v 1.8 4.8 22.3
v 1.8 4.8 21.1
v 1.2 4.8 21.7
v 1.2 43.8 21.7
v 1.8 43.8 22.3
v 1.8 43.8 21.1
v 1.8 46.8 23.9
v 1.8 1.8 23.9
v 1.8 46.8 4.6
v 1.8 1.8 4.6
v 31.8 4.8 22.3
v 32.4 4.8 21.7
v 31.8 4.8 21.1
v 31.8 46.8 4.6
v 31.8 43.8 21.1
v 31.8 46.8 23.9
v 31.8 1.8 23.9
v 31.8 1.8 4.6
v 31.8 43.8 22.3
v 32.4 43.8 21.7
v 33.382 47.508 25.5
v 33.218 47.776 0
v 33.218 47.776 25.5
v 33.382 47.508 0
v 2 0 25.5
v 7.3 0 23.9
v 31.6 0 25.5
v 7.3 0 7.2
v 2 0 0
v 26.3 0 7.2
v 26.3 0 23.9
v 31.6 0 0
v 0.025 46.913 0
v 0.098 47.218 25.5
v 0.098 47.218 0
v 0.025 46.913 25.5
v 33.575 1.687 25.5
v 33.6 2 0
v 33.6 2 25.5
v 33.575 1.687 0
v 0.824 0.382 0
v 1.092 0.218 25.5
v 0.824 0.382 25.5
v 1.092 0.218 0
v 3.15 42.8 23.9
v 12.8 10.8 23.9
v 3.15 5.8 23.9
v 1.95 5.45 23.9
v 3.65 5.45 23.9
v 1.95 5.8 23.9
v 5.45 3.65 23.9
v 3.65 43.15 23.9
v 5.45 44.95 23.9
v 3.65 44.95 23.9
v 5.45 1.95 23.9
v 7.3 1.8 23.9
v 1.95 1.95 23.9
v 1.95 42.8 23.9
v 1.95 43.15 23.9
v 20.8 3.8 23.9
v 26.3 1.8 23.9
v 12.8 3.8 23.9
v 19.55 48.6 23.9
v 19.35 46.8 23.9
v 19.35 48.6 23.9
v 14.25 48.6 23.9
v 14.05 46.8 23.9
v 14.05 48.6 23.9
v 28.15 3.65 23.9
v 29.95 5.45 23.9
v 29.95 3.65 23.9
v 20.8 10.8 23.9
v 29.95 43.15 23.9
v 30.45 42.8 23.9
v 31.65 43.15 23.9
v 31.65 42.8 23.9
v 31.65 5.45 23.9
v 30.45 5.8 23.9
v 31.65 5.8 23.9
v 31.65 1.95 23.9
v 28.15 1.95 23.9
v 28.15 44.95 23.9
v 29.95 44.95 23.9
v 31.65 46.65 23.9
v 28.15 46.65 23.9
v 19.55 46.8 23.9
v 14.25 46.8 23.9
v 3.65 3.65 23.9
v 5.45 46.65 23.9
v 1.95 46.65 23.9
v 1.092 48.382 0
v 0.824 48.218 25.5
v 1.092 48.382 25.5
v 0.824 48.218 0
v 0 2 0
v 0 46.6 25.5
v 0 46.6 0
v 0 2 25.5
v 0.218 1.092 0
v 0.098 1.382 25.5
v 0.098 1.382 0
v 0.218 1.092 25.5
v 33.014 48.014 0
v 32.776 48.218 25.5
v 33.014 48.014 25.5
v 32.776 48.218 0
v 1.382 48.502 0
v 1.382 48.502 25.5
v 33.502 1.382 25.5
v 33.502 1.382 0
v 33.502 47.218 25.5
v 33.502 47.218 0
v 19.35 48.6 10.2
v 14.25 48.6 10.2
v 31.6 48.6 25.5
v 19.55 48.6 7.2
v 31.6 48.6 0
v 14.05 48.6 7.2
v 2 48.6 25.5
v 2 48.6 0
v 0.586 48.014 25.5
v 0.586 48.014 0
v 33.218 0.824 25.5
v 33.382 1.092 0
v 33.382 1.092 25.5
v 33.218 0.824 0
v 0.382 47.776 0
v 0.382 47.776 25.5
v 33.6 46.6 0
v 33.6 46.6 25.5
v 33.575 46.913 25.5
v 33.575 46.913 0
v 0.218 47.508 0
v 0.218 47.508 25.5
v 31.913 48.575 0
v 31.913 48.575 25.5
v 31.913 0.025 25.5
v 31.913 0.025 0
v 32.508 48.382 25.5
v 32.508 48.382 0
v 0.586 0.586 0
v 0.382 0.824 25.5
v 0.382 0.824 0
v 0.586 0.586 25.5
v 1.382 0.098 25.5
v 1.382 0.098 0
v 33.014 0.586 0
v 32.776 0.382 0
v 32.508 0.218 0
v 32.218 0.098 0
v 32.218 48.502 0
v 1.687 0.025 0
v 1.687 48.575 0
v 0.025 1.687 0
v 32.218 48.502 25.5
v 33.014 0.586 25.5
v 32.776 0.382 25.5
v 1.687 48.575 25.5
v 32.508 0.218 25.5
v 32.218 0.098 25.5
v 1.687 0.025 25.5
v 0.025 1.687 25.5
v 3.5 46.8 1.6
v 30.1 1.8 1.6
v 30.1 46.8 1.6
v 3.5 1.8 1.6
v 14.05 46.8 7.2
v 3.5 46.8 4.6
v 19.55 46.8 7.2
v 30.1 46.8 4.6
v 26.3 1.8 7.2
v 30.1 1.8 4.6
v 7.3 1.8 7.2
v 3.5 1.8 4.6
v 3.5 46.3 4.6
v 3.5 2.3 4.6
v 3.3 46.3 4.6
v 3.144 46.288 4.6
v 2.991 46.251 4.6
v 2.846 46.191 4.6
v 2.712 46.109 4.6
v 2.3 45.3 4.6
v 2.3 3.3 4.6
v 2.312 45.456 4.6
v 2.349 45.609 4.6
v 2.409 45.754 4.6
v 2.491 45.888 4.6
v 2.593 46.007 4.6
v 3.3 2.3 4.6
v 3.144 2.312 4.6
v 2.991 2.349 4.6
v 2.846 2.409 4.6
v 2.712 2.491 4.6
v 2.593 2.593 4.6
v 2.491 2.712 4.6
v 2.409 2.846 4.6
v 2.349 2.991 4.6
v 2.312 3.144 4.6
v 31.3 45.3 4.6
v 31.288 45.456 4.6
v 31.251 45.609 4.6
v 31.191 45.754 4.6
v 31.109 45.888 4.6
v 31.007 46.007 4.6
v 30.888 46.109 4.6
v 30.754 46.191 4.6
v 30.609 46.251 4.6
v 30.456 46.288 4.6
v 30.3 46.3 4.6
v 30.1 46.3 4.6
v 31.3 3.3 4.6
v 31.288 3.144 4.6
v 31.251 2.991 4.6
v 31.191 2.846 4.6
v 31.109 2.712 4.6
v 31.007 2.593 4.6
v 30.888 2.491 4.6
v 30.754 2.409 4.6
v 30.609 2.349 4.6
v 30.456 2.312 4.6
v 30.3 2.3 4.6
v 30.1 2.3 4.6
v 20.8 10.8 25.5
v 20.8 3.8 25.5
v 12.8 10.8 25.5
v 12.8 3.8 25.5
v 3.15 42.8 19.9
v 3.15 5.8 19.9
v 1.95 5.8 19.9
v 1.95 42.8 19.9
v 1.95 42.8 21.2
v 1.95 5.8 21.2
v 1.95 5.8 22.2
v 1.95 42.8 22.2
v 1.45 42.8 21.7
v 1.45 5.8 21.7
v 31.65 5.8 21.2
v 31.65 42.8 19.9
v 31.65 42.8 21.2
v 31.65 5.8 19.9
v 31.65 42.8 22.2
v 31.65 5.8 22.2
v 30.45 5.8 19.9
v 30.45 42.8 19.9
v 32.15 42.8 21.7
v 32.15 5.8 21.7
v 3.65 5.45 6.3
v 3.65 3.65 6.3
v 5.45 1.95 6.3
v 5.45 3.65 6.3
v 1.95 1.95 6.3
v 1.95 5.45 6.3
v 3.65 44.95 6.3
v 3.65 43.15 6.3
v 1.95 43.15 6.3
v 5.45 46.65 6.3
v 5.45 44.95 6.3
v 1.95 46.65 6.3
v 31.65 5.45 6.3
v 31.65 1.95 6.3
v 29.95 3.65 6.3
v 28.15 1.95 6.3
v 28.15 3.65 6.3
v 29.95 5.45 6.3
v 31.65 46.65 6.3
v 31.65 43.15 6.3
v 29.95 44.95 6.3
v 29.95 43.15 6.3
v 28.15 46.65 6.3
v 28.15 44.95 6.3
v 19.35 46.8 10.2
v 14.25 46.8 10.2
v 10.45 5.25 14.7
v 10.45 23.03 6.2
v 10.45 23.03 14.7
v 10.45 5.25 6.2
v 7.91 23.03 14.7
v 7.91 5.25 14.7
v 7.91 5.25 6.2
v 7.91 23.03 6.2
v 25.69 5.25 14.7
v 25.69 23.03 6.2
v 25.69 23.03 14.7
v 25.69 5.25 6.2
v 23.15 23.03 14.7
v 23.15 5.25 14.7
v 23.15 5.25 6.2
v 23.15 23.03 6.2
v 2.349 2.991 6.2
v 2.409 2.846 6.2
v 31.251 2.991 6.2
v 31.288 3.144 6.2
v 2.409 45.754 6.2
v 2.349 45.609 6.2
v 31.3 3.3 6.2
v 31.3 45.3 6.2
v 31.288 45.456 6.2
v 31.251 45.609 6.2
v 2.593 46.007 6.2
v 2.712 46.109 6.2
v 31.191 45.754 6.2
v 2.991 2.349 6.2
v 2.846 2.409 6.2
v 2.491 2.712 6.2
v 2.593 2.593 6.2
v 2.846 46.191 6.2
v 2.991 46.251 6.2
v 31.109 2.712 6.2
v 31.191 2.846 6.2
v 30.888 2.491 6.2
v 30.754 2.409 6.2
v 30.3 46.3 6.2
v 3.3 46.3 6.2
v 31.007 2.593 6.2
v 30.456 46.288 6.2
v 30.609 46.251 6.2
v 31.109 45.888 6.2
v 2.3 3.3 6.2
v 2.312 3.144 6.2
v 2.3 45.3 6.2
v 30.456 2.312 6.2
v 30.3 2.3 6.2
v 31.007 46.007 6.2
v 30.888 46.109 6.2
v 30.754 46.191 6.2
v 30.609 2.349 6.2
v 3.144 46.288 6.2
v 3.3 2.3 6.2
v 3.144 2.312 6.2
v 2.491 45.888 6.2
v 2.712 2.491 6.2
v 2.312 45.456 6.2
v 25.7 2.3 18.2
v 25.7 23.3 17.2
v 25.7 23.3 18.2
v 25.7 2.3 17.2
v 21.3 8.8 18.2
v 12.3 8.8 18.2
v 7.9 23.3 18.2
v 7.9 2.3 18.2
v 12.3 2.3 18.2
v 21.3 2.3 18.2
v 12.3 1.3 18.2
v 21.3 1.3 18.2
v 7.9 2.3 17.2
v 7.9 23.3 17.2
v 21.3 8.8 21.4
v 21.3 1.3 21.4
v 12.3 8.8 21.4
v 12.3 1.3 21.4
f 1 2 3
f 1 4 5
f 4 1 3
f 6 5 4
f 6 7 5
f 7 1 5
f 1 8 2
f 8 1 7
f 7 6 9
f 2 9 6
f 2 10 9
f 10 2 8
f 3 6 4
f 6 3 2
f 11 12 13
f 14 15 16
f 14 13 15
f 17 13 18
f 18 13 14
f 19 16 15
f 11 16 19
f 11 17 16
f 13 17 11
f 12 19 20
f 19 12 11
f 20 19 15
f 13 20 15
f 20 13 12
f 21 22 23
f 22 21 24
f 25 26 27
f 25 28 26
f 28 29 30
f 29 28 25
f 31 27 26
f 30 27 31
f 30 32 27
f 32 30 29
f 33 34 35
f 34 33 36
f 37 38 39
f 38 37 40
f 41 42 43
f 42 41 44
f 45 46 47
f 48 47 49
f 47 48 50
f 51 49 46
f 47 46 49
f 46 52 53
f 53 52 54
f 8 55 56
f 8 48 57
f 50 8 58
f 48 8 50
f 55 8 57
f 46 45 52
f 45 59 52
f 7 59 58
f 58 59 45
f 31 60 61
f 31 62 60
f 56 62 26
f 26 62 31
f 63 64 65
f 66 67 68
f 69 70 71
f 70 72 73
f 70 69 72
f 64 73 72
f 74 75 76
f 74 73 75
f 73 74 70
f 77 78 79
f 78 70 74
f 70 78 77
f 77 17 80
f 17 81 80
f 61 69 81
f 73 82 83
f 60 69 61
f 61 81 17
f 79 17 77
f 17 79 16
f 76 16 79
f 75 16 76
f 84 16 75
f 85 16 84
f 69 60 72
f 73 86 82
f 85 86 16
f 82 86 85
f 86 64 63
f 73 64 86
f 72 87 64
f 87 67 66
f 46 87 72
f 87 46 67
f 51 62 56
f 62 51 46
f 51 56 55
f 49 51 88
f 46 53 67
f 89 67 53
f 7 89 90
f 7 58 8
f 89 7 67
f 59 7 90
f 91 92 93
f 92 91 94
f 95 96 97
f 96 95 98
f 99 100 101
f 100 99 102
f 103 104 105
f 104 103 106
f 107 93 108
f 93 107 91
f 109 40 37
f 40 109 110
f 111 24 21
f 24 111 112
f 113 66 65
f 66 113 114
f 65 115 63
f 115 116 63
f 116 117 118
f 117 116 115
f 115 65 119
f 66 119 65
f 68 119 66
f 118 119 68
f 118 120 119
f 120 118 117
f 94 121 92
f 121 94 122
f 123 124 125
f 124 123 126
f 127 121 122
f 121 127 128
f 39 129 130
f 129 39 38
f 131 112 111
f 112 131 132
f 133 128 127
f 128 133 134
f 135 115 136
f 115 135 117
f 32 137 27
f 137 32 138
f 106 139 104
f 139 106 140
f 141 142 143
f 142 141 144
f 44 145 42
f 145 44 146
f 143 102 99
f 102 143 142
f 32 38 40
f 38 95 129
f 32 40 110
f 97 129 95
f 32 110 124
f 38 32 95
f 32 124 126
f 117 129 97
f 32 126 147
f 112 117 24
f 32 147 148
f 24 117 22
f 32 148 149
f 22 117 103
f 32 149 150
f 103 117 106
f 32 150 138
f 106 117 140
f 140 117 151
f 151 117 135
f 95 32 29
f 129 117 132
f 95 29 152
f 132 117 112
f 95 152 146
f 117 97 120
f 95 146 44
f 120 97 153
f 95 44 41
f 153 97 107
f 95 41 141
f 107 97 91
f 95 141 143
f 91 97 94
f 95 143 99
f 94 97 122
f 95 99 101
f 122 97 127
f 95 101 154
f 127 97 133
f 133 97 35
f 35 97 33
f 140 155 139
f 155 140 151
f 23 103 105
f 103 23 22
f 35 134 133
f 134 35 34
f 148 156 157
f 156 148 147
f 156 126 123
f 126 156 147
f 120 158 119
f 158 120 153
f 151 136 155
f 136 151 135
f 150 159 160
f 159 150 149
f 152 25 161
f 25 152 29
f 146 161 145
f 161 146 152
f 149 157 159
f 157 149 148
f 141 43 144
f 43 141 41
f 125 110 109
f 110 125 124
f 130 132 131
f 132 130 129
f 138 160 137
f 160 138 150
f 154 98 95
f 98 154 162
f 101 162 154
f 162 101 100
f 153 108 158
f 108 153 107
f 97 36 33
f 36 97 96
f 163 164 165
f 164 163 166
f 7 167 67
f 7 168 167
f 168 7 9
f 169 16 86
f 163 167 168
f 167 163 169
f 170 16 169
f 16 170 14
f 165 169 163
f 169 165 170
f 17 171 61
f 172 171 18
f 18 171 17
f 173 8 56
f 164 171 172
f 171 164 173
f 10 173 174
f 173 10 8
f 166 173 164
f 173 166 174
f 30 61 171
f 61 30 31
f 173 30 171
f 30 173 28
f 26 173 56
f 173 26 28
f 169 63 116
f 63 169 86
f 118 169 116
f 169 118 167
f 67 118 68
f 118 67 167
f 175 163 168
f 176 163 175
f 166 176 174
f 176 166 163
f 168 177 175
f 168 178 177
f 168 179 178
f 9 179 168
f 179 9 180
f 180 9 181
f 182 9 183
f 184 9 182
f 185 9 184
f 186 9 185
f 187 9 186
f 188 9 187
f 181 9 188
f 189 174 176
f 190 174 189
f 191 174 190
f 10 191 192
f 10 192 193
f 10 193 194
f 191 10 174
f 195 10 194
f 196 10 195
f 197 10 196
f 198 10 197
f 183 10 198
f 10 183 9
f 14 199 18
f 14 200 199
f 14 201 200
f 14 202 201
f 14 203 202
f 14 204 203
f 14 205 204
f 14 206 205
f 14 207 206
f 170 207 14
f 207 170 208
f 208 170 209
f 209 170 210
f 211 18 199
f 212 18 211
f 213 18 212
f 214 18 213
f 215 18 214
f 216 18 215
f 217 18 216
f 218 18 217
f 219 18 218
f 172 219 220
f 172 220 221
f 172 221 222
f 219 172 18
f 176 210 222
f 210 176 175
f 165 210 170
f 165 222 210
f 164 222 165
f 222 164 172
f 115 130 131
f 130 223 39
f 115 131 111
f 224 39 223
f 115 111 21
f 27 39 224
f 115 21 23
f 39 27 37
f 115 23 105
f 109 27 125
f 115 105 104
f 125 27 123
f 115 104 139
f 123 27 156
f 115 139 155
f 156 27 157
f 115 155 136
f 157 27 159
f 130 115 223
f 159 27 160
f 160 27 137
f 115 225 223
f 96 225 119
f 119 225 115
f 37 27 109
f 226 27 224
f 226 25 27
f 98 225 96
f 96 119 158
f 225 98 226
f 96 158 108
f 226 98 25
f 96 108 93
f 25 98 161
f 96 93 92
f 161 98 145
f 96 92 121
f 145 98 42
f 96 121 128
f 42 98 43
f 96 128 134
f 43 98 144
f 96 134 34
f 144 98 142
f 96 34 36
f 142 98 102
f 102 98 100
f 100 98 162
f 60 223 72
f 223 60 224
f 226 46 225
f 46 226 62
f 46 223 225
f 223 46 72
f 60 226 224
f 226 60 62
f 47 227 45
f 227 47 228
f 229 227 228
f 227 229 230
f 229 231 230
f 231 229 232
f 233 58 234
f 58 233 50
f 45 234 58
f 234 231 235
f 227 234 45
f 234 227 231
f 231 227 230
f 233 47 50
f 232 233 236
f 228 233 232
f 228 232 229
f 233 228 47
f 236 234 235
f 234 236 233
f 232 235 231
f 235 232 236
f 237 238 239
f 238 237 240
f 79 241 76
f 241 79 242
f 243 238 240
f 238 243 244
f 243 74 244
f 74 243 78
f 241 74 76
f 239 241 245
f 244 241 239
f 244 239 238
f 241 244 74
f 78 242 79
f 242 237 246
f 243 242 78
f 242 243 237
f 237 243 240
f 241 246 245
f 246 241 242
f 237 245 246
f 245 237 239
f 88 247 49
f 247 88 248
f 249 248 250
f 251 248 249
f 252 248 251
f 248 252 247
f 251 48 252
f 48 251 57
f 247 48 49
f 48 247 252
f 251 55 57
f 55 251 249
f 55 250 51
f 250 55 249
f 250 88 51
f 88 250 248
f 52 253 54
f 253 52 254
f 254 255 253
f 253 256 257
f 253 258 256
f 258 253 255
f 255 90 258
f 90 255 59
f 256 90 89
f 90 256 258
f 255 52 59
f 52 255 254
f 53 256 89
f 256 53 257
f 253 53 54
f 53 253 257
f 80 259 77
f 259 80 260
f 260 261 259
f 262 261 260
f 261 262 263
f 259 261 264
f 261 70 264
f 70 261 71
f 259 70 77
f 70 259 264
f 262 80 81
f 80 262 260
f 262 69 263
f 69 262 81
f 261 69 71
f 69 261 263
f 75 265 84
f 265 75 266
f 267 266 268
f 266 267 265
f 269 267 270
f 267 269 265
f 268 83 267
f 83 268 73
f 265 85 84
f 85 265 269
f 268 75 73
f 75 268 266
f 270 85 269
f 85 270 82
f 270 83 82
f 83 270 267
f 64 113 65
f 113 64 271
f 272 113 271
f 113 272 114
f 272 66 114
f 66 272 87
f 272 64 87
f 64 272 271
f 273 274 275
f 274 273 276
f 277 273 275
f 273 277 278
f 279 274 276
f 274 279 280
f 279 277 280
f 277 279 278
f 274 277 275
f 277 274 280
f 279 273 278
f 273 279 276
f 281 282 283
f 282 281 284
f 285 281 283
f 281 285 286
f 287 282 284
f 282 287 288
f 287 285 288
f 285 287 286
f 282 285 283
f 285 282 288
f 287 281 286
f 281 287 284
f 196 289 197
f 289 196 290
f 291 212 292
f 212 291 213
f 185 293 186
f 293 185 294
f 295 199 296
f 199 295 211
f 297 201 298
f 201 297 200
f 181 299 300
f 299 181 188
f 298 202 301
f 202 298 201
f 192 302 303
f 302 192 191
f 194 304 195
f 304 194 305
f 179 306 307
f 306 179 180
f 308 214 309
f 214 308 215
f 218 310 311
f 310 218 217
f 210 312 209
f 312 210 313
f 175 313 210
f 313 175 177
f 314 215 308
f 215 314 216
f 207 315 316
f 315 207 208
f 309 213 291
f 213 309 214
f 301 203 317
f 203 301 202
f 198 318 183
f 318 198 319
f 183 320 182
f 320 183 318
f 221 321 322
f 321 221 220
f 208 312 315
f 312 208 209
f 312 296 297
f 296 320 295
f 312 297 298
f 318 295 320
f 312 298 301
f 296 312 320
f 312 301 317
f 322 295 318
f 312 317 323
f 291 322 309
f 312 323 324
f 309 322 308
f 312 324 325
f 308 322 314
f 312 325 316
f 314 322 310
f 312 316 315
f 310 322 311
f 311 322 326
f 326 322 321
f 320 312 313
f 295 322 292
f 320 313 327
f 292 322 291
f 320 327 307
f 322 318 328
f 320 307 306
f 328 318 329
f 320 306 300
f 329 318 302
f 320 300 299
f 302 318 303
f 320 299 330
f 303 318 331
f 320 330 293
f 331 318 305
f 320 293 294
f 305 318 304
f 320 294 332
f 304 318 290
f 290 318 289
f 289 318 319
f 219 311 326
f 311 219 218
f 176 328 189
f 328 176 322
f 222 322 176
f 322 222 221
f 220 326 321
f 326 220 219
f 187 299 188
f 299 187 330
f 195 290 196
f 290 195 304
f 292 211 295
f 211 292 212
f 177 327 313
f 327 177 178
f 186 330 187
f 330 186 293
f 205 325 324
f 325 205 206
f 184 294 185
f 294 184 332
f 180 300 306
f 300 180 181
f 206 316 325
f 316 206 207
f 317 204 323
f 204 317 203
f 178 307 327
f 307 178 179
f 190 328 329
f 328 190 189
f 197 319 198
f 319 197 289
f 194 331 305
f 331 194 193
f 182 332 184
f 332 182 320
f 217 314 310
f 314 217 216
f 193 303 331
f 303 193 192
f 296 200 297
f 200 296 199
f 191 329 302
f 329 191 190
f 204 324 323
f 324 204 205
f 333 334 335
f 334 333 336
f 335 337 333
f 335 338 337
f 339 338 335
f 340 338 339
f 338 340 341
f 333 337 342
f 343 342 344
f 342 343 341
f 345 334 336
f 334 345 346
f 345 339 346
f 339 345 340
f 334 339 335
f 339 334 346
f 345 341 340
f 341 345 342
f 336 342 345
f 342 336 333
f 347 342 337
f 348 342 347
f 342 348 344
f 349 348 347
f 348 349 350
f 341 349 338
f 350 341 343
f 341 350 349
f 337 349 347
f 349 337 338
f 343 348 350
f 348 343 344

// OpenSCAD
// pwmfan ケース: タカチ TNF29-44 (29 x 44 x 1.6 mm) ユニバーサル基板用
//
// 基板上の構成 (2026-10-24 実装):
//   - XIAO ESP32C6 をピンソケットに挿し、USB-C を基板の短辺から外へ向ける
//   - 2N7000 + 100kΩ、ハブへの線は直出し (先にコネクタ付きでも通せる切り欠き)
//
// 出力:
//   openscad -D 'PART="base"' -o case_tnf2944_base.stl case_tnf2944.scad
//   openscad -D 'PART="lid"'  -o case_tnf2944_lid.stl  case_tnf2944.scad
//   PART="assembly" で基板・XIAO のダミーを入れた組み立て図 (確認用)
//
// 印刷: PETG / 0.4mm ノズル / 0.2mm レイヤー / 壁 3 周 / サポート不要。
//   base は開口を上に、lid は天面をベッドに (どちらも出力済みの向きのまま)。
//
// 基板寸法はタカチの図面 (TNF29-44.dxf) から:
//   外形 29 x 44、四隅 R1、穴 Ø1.0 を 2.54 ピッチで 10 x 15。
//   穴の中心は長辺の縁から 3.07、短辺の縁から 2.95 (片側) と 5.49 (反対側)。
//   取付穴は無い (純正の SW-50 ケースも溝で挟む) ので、棚で受けて蓋のリブで押さえる。

PART = "assembly";   // "base" | "lid" | "assembly"

// ---- 実物に合わせて調整する寸法 -------------------------------------------
socket_h     = 8.5;  // ピンソケット本体の高さ (TNF 上面から)
hdr_spacer   = 2.5;  // XIAO 側オスピンヘッダの樹脂スペーサー厚
xiao_dx      = 0;    // XIAO 中心線の基板中心からの横ずれ (+X)。奇数列なら ±1.27
usb_overhang = 0;    // XIAO の USB 端面が基板の縁から外へ出ている量 (内側なら 0)
under        = 3.0;  // 床から基板下面まで (裏のはんだ・線の逃げ)

// ---- 基本寸法 -----------------------------------------------------------
pcb_w = 29;  pcb_l = 44;  pcb_t = 1.6;  pcb_r = 1;
clr    = 0.5;   // 基板と壁のすき間 (片側)。0.3 では印刷品で側面がつかえた (v1, 2026-10-25)
wall   = 1.8;
floor_t = 1.6;
lid_t  = 1.6;
corner_r = 2.0; // 外形の角 R

xiao_w = 17.8; xiao_l = 21.0; xiao_pcb_t = 1.0;
usbc_h = 3.2;   // USB-C レセプタクルの高さ (XIAO 上面から)
top_clear = 2.5;

// 開口
// USB 側の切り欠き。v1 (幅 15.5、底は USB-C の下 2.6mm) では XIAO の基板 (17.8 幅) が
// 縁からはみ出していると壁の上端に乗り、基板が 3mm 以上浮いた。XIAO ごと通る幅にし、
// 底を基板上面のすぐ上まで下げて、XIAO の高さ・はみ出し量によらず落とし込めるようにする。
usb_w     = 19.0;   // XIAO 17.8 + 片側 0.6
usb_floor = 1.0;    // 切り欠きの底: 基板上面からの高さ (下の壁が基板の前後を止める)
cable_w   = 5.5;  // 線の切り欠き幅
cable_gap = 3.0;  // 蓋の舌の下に残す線の通り道の高さ
led_win = [8, 7]; // 蓋の窓 (X, Y)。XIAO の LED とリセット/ブートボタンの上

// スナップ
skirt_d = 4.0;  skirt_t = 1.2;  skirt_gap = 0.15;
snap_h  = 0.5;  // 突起・溝の深さ
snap_z  = 2.2;  // 壁の上端から溝の中心まで

// ---- 導出値 (z はベース底面 = 0) ------------------------------------------
in_w = pcb_w + 2*clr;
in_l = pcb_l + 2*clr + usb_overhang;
out_w = in_w + 2*wall;
out_l = in_l + 2*wall;

board_z   = floor_t + under;          // 基板下面
board_top = board_z + pcb_t;
xiao_z    = board_top + socket_h + hdr_spacer;
xiao_top  = xiao_z + xiao_pcb_t;
base_h    = xiao_top + usbc_h + top_clear;   // ベース壁の上端 = 蓋の下面
xc        = wall + in_w/2 + xiao_dx;          // XIAO 中心 X (外形座標)
board_y0  = wall + clr + usb_overhang;        // 基板の USB 側の縁 (Y)
xiao_y0   = board_y0 - usb_overhang;          // XIAO の USB 側の端 (Y)

cable_z = board_top + 1.0;                    // 線の切り欠きの底

$fn = 40;
eps = 0.01;

module rrect(w, l, h, r) {
  hull() for (x = [r, w - r], y = [r, l - r]) translate([x, y, 0]) cylinder(r = r, h = h);
}

// 長辺の壁の内側に入れる三角断面の溝 / 蓋スカートの外側の突起
module tri_bar(len, depth, toward_minus_x = false) {
  // X 方向に depth (toward_minus_x なら -X)、Z 方向に ±depth の三角柱を Y に len だけ伸ばす
  s = toward_minus_x ? -1 : 1;
  rotate([-90, 0, 0]) linear_extrude(len)
    polygon([[0, -depth], [s * depth, 0], [0, depth]]);
}

module base() {
  difference() {
    rrect(out_w, out_l, base_h, corner_r);
    // 中空
    translate([wall, wall, floor_t]) cube([in_w, in_l, base_h]);
    // USB 側: XIAO ごと通る幅で上から U 字に切り欠き (蓋の板が上を閉じる)
    translate([xc - usb_w/2, -eps, board_top + usb_floor]) cube([usb_w, wall + 2*eps, base_h]);
    // 線: 反対側の短辺を上から切り欠き (蓋の舌が上を塞ぐ)
    translate([wall + in_w/2 - cable_w/2, out_l - wall - eps, cable_z]) cube([cable_w, wall + 2*eps, base_h]);
    // スナップ溝 (長辺 2 面の内側)
    for (side = [0, 1])
      translate([side ? wall + in_w : wall, wall + 3, base_h - snap_z])
        tri_bar(in_l - 6, snap_h + 0.1, toward_minus_x = side == 0);
  }
  // 基板を受ける棚 (長辺 2 面)。裏のパッド (縁から 2.2mm 以降) に掛からない幅
  ledge = clr + 1.2;
  for (x = [wall, wall + in_w - ledge])
    translate([x, wall, floor_t - eps]) cube([ledge, in_l, under + eps]);
}

module lid() {
  // 天面の板
  difference() {
    translate([0, 0, base_h]) rrect(out_w, out_l, lid_t, corner_r);
    // LED / ボタンの窓: XIAO の USB 側の端から 1.5mm 内側から
    translate([xc - led_win[0]/2, xiao_y0 + 1.5, base_h - eps]) cube([led_win[0], led_win[1], lid_t + 2*eps]);
  }
  // スナップのスカート (長辺 2 面)
  sx_in = wall + skirt_gap;
  for (side = [0, 1]) {
    x0 = side ? wall + in_w - skirt_gap - skirt_t : sx_in;
    translate([x0, wall + 4, base_h - skirt_d]) cube([skirt_t, in_l - 8, skirt_d + eps]);
    translate([side ? wall + in_w - skirt_gap : sx_in, wall + 4, base_h - snap_z])
      tri_bar(in_l - 8, snap_h, toward_minus_x = side == 0);
  }
  // 基板を上から押さえる四隅のリブ。長辺と短辺の両方の壁に沿う L 字にして、
  // 細い柱 (17mm 超) の印刷時の揺れと押さえ力の逃げを防ぐ。基板上面との間に 0.1。
  // USB 側は基板の縁に合わせる (usb_overhang > 0 でも基板の角を押さえる)。
  leg = clr + 1.2;   // 基板の縁に 1.2 掛かる (穴のランドは縁から 2.2 以降)
  arm = 3.5;
  rib_z = board_top + 0.1;
  for (sx = [0, 1], sy = [0, 1]) {
    x0 = sx ? wall + in_w - skirt_gap : wall + skirt_gap;
    y0 = sy ? wall + in_l - skirt_gap : board_y0 - clr + skirt_gap;
    dx = sx ? -1 : 1;  dy = sy ? -1 : 1;
    translate([x0, y0, rib_z]) {
      // 長辺側の脚
      translate([dx < 0 ? -leg : 0, dy < 0 ? -arm : 0, 0]) cube([leg, arm, base_h - rib_z + eps]);
      // 短辺側の脚
      translate([dx < 0 ? -arm : 0, dy < 0 ? -leg : 0, 0]) cube([arm, leg, base_h - rib_z + eps]);
    }
  }
  // 線の切り欠きを上から塞ぐ舌 (線の通り道 cable_gap を残す)
  tz = cable_z + cable_gap;
  translate([wall + in_w/2 - cable_w/2 + 0.2, out_l - wall, tz]) cube([cable_w - 0.4, wall, base_h - tz + eps]);
}

// 確認用ダミー
module dummy() {
  color("green") translate([wall + clr, board_y0, board_z]) rrect(pcb_w, pcb_l, pcb_t, pcb_r);
  color("black") for (dx = [-7.62, 7.62])
    translate([xc + dx - 1.27, board_y0 + 2.95, board_top]) cube([2.54, 7*2.54, socket_h]);
  color("purple") translate([xc - xiao_w/2, xiao_y0, xiao_z]) cube([xiao_w, xiao_l, xiao_pcb_t]);
  color("silver") translate([xc - 4.5, xiao_y0 - 1, xiao_top]) cube([9, 7.5, usbc_h]);
}

// 断面図 (確認用): XIAO の中心で縦に切る
module section() {
  intersection() {
    union() { color("steelblue") base(); color("orange") lid(); dummy(); }
    translate([-1, -1, -1]) cube([xc + 1 - 0.37, out_l + 2, base_h + lid_t + 2]);
  }
}

if (PART == "base") base();
else if (PART == "section") section();
else if (PART == "lid") translate([0, out_l, base_h + lid_t]) rotate([180, 0, 0]) lid();
else { base(); color("orange", 0.35) lid(); dummy(); }
